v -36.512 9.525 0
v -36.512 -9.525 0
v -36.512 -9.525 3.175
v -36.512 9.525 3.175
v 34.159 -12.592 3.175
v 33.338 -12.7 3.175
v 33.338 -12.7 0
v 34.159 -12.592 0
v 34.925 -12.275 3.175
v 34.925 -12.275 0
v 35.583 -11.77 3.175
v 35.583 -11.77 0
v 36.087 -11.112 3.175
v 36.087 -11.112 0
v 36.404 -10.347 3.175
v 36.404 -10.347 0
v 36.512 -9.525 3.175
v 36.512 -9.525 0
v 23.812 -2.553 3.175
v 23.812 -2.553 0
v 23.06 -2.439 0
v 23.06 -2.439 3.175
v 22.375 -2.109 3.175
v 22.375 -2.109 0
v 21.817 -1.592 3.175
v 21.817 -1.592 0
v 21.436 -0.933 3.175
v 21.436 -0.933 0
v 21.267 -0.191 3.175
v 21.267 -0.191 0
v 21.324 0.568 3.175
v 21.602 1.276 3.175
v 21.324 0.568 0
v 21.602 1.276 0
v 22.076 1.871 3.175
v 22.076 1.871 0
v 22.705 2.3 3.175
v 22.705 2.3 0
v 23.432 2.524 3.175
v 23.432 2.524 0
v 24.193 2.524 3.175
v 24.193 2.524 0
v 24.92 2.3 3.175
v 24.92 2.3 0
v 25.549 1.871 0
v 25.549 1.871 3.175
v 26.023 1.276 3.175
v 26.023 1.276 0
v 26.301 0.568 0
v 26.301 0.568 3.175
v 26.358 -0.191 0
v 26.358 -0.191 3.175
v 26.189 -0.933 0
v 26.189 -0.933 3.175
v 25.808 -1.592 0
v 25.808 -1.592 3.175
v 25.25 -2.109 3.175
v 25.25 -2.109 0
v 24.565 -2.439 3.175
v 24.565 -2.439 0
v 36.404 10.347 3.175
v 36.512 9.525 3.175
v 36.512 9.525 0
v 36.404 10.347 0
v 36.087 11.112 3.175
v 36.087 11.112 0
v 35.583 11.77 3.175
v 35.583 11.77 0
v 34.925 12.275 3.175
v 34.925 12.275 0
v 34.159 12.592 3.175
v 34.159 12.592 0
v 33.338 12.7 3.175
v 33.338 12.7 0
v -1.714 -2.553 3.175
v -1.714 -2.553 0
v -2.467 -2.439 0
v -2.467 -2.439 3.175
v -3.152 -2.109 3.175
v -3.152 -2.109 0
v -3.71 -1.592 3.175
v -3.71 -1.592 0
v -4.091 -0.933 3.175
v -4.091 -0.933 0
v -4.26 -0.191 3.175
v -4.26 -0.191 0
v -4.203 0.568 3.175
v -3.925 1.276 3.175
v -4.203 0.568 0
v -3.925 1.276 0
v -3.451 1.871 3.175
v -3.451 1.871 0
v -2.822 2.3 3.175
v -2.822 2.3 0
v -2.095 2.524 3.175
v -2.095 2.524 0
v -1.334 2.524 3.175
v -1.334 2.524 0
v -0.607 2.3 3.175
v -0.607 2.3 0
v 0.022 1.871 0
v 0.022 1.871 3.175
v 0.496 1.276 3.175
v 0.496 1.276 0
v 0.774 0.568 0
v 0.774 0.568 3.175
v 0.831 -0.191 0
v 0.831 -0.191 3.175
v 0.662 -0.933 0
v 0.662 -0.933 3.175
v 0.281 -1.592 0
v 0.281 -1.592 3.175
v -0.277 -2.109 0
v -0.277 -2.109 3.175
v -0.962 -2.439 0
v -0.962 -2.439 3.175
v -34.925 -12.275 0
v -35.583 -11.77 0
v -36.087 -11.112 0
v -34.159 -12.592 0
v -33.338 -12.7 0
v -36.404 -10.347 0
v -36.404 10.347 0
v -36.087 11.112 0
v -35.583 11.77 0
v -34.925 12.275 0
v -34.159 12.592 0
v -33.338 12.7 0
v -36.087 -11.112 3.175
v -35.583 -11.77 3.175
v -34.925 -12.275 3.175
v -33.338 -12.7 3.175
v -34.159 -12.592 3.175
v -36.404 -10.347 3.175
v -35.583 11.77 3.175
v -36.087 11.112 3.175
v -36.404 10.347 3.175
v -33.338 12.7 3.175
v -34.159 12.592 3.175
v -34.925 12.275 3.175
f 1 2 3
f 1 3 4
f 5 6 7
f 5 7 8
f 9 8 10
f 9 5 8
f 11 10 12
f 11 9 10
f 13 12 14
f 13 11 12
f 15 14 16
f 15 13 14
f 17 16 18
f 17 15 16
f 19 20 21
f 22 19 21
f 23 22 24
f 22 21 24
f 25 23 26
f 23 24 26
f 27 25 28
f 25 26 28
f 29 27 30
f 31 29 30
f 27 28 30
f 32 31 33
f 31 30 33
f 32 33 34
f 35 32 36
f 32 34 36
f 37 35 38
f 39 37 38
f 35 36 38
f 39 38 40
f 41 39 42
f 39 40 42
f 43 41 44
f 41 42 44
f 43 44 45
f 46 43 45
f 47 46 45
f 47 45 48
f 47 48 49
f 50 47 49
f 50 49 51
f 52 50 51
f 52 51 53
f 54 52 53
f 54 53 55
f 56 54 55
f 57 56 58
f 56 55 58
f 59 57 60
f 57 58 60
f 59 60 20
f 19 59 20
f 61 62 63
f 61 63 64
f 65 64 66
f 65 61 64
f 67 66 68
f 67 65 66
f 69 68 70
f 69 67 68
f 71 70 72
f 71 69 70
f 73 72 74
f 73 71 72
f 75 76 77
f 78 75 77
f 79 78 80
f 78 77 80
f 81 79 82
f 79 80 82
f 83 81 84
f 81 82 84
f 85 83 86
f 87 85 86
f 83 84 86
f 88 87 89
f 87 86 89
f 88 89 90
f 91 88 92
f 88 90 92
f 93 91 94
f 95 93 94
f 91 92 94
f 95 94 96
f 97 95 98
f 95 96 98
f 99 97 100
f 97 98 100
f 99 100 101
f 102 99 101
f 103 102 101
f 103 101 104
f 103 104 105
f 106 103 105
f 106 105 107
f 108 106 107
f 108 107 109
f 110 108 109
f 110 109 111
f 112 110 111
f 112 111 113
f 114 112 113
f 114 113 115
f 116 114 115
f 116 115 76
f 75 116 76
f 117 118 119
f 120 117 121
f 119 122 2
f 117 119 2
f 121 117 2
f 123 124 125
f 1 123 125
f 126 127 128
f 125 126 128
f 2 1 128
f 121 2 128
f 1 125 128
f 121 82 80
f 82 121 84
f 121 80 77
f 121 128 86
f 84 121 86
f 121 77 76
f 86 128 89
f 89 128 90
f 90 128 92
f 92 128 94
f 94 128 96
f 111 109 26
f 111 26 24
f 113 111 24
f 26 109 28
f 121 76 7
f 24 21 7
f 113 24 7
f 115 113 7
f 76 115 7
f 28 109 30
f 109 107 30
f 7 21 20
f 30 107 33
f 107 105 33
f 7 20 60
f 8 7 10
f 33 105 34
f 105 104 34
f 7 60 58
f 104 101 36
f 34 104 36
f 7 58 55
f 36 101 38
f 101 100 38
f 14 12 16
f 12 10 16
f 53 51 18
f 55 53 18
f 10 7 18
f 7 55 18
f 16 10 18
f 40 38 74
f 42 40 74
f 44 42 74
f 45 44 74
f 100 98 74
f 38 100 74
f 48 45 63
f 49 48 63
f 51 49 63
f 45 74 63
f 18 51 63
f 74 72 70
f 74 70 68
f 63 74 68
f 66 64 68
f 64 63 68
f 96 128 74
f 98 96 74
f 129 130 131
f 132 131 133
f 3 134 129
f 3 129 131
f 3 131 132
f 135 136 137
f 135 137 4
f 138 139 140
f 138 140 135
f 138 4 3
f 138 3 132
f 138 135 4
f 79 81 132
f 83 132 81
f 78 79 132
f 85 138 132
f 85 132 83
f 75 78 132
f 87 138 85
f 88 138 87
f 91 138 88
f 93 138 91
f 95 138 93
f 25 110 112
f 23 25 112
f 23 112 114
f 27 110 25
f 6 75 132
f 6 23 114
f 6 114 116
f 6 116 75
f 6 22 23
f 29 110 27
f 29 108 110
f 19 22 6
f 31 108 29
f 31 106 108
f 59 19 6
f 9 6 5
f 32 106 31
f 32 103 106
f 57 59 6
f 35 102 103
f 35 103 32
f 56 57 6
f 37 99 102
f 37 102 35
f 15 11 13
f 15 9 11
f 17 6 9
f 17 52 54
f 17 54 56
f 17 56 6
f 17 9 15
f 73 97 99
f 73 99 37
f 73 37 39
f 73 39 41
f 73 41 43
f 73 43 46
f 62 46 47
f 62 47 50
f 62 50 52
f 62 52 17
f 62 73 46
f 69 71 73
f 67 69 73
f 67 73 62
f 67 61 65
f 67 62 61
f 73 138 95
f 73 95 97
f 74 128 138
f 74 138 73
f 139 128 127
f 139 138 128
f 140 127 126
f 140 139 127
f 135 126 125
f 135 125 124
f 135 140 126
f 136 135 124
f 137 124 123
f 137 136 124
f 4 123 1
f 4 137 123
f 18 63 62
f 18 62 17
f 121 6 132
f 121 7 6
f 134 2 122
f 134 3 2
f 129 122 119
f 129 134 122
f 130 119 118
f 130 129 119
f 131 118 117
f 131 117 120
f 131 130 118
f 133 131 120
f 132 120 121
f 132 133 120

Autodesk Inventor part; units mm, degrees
ref_plane "YZ Plane" through (0, 0, 0) normal (1, 0, 0) x (0, 1, 0)
ref_plane "XZ Plane" through (0, 0, 0) normal (0, 1, 0) x (-1, 0, 0)
ref_plane "XY Plane" through (0, 0, 0) normal (0, 0, 1) x (1, 0, 0)
sketch "Sketch1" plane through (0, 0, 0) normal (0, 0, 1) x (1, 0, 0)
  line L0 (-36.5125, 12.7) -> (36.5125, 12.7)
  line L1 (36.5125, 12.7) -> (36.5125, -12.7)
  line L2 (36.5125, -12.7) -> (-36.5125, -12.7)
  line L3 (-36.5125, -12.7) -> (-36.5125, 12.7)
  line L4 (-36.5125, 12.7) -> (36.5125, -12.7) construction
  line L5 (36.5125, 12.7) -> (-36.5125, -12.7) construction
  point P0 (0, 0)
  dimension "d15" = 73.025
  dimension "d16" = 25.4
extrude "Extrusion1" add sketch "Sketch1" along normal blind 3.175
sketch "Sketch3" plane through (0, 0, 3.175) normal (0, 0, 1) x (1, 0, 0)
  line L0 (-36.5125, 12.7) -> (-36.5125, -12.7) projected
  line L1 (36.5125, -12.7) -> (36.5125, 12.7) projected
  point P0 (0, 0)
  point P1 (23.8125, 0)
  point P2 (-1.7145, 0)
  point P3 (36.5125, 0)
  dimension "d17" = 25.527
  dimension "d27" = 12.7
hole "Hole2" at (23.8125, 0, 3.175) at (-1.7145, 0, 3.175) direction (0, 0, -1) diameter 5.1054 end through all clearance for "Flat Head Machine Screw (82)" size "#10" standard "Ansi Unified Screw Threads"
fillet "Fillet2" radius 3.175 4 edges at (-36.5125, 12.7, 1.5875) (-36.5125, -12.7, 1.5875) (36.5125, 12.7, 1.5875) (36.5125, -12.7, 1.5875)
properties part number "EL2-016" material "Aluminum 6061"
